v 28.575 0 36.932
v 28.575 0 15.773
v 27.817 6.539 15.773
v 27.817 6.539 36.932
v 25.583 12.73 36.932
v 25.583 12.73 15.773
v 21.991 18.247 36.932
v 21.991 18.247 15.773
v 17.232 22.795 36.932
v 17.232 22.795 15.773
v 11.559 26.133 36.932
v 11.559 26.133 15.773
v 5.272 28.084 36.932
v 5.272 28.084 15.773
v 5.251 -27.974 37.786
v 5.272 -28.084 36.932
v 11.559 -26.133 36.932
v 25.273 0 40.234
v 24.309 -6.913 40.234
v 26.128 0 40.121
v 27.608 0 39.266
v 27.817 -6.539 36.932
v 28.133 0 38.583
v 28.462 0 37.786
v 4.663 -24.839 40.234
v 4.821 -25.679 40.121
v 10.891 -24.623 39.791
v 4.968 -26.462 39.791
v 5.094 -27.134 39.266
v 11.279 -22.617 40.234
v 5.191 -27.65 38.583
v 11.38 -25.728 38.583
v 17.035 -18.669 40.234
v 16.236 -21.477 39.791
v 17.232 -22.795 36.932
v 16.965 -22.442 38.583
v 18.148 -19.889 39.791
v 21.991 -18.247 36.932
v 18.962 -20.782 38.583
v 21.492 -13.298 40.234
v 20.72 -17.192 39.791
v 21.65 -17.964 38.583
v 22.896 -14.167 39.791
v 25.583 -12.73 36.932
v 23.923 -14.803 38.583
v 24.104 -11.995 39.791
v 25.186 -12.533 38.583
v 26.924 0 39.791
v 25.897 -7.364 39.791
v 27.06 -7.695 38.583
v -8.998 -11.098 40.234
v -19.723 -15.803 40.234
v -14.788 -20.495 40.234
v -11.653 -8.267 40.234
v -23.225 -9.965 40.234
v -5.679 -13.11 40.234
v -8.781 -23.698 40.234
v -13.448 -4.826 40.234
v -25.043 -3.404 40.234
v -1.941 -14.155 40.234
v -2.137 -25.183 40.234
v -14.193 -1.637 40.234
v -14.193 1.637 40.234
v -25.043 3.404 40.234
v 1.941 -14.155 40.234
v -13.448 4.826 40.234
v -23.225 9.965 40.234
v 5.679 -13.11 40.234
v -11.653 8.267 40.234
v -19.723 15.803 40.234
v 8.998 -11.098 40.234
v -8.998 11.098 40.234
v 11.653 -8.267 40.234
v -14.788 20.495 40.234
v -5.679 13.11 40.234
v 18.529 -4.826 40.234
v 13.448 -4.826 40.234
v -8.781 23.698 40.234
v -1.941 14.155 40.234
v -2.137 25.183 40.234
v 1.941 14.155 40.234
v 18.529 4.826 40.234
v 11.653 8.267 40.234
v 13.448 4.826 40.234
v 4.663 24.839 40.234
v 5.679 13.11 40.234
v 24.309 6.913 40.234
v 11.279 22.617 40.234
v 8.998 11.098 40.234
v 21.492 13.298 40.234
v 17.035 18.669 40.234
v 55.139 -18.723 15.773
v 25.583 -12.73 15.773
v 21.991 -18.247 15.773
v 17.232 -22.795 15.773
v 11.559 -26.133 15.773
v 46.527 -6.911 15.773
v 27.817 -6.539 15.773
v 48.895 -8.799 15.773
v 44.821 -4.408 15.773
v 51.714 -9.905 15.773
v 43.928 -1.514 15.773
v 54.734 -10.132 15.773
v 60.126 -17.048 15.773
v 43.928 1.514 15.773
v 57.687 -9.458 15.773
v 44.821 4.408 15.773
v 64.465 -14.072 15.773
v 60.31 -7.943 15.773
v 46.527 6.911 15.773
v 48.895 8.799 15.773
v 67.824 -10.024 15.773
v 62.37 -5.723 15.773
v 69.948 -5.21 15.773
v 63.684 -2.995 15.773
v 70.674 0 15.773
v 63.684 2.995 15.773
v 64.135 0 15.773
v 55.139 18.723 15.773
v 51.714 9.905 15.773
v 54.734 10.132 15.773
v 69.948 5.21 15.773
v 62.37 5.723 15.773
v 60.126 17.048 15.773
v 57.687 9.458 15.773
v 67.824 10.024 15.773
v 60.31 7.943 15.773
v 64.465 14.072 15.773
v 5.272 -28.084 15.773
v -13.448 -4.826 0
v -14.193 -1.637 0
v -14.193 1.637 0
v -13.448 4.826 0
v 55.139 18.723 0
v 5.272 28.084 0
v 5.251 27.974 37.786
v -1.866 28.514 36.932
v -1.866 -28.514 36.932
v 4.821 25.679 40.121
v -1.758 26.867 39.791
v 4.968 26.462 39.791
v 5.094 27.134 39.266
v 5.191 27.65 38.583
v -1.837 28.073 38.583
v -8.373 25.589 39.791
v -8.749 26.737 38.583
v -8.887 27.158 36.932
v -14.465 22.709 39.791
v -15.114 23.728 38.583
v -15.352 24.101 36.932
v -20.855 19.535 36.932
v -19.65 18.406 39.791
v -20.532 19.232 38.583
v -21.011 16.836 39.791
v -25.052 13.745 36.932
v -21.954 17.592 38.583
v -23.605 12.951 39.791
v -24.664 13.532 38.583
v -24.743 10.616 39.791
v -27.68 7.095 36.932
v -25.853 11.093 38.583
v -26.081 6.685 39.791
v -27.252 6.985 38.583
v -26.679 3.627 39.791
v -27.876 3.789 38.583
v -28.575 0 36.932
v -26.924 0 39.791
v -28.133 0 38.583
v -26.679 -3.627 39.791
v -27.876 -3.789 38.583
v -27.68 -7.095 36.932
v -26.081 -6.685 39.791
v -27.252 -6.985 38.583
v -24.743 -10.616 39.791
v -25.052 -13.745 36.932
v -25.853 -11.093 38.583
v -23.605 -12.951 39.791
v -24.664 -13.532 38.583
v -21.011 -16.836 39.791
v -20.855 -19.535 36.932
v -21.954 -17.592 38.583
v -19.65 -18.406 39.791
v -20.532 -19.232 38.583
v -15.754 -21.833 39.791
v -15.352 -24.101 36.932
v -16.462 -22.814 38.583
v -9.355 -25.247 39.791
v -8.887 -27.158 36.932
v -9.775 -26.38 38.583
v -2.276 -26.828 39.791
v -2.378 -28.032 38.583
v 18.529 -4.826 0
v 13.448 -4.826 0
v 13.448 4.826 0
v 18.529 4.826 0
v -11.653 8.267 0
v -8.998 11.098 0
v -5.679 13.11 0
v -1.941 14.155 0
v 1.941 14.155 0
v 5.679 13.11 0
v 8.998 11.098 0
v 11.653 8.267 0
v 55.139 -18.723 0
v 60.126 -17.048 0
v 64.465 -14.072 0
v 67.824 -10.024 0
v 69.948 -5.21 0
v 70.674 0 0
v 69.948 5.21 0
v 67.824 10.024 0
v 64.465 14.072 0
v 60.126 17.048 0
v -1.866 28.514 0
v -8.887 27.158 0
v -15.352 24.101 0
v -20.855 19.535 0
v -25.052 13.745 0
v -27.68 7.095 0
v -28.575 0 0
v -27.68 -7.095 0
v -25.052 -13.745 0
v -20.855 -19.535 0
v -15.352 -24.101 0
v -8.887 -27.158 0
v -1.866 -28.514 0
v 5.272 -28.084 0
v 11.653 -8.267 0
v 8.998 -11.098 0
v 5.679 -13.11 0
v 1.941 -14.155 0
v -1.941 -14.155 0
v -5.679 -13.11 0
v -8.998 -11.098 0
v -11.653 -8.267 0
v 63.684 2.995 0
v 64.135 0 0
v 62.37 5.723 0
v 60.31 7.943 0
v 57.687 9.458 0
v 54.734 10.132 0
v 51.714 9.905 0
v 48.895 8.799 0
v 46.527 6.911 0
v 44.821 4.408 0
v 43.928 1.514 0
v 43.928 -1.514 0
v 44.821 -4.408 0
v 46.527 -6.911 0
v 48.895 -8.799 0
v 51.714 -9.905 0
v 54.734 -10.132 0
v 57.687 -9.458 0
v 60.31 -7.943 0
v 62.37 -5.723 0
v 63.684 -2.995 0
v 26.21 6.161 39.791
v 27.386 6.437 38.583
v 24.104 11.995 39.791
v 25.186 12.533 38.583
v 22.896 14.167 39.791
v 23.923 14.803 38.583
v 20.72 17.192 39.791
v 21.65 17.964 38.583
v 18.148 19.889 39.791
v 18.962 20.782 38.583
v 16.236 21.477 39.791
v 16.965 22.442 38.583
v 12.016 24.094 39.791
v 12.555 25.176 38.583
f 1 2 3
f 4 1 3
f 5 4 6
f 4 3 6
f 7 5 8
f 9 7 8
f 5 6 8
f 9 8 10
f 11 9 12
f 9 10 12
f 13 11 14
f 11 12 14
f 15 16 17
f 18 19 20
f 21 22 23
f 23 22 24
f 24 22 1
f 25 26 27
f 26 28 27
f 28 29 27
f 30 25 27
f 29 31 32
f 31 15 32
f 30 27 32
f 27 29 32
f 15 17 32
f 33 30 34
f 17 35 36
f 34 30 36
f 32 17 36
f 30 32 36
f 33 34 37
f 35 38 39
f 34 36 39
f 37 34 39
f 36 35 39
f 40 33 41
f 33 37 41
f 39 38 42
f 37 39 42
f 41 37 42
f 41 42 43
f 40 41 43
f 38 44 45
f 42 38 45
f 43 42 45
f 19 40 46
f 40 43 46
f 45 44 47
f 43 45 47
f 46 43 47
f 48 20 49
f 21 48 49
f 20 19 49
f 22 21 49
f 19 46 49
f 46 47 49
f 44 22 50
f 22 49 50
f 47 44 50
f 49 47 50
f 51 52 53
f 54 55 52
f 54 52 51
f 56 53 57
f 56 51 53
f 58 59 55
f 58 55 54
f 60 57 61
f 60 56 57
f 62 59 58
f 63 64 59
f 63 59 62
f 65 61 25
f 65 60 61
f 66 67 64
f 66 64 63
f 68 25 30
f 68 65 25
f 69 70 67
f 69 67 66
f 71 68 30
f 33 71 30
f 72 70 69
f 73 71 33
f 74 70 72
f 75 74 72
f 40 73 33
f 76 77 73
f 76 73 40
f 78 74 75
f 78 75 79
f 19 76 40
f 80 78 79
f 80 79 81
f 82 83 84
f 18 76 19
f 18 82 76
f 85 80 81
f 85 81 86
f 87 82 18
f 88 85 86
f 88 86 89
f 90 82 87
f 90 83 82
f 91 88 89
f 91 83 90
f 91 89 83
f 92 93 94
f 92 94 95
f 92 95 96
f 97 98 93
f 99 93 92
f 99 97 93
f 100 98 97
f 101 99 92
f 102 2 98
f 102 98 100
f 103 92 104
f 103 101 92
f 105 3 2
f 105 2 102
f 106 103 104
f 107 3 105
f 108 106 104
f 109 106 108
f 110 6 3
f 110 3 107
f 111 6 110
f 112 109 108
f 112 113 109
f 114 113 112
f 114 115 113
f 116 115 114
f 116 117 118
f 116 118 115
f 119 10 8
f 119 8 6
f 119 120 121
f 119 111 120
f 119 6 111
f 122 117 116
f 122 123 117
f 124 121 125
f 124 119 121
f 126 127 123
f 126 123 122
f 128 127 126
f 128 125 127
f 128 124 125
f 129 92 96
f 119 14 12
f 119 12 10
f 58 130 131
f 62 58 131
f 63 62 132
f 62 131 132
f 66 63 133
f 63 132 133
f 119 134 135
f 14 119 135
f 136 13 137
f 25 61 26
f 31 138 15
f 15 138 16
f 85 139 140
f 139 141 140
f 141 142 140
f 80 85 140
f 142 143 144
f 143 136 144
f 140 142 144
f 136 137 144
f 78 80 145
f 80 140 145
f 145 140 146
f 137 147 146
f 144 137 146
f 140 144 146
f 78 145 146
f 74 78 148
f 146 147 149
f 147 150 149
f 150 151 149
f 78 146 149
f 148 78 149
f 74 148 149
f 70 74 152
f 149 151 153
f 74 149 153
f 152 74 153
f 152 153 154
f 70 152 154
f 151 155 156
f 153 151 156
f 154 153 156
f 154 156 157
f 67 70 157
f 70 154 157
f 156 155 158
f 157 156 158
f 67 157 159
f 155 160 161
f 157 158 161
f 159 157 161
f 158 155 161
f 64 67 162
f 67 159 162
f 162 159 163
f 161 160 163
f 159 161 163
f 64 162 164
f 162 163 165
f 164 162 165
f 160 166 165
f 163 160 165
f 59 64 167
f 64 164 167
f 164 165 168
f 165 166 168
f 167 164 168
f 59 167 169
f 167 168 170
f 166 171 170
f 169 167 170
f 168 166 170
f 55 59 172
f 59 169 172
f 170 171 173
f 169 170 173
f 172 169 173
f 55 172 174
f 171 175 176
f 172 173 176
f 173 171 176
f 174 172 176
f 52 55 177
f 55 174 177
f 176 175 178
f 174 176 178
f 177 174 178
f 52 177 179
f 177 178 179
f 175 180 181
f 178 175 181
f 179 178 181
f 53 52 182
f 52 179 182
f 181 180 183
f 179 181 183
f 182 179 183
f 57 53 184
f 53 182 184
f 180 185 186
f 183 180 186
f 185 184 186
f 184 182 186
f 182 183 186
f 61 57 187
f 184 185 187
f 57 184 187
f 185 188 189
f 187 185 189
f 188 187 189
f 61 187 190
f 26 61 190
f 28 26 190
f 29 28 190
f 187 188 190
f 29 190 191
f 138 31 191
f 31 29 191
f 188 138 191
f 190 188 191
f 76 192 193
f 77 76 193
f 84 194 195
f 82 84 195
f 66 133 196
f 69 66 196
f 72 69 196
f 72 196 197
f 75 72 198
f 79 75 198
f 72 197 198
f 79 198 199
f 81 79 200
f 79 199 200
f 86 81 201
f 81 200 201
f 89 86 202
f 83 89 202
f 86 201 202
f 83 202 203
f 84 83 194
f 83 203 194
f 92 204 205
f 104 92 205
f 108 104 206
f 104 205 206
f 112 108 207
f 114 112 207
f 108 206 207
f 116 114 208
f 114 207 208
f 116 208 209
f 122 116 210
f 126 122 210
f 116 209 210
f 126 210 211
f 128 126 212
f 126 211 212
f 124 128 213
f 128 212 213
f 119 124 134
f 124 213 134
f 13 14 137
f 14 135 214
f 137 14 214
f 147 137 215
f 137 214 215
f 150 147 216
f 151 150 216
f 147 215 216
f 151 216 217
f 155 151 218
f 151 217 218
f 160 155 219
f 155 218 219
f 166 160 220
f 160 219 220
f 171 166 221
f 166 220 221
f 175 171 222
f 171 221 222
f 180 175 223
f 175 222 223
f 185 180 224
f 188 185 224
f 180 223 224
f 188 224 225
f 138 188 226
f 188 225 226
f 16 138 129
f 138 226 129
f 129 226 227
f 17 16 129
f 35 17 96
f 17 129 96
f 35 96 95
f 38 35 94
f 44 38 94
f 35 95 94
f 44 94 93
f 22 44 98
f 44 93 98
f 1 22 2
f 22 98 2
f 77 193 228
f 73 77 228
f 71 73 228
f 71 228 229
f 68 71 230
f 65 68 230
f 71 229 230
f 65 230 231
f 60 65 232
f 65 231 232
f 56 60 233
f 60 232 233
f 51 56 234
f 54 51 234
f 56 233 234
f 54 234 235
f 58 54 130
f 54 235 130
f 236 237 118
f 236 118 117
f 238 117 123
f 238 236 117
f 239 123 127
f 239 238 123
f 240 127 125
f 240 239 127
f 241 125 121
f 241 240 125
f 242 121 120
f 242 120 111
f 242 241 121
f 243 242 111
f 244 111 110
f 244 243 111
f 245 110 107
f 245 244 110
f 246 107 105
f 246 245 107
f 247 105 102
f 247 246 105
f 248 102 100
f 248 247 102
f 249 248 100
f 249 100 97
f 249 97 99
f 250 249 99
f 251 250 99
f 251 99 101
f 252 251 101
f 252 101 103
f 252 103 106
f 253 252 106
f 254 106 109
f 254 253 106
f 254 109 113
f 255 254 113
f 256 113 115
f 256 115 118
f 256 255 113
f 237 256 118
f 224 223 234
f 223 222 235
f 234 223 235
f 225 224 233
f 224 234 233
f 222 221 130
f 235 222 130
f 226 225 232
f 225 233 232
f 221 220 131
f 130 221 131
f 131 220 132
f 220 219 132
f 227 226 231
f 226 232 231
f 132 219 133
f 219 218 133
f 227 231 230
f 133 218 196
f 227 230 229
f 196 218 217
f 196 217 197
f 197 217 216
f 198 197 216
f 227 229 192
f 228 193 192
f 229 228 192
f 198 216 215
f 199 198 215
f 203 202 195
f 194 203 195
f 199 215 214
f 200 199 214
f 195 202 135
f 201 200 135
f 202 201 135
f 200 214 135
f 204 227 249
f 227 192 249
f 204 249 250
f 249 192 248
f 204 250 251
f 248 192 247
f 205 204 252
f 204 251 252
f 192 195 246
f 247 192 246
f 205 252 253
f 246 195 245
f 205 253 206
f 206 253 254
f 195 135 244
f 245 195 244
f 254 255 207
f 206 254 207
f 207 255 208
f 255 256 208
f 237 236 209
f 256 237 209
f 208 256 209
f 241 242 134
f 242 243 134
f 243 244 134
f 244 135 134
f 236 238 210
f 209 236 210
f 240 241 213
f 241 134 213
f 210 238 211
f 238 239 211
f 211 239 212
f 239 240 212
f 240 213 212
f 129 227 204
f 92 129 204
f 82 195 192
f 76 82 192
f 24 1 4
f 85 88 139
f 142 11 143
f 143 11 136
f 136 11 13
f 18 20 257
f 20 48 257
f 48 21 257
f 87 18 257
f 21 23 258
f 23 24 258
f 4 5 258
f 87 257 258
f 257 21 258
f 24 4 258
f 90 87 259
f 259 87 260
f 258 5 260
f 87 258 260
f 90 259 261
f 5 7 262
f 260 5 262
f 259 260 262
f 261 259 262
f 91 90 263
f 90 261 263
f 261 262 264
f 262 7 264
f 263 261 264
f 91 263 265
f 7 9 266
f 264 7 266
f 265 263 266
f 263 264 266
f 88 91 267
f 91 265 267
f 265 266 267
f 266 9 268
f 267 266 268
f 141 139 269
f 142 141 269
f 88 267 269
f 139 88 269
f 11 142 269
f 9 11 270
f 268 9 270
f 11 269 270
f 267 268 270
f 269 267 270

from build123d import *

# Parameters (mm, degrees)
F0_R     = 10.16
F1_DEPTH = 15.7734
F2_DEPTH = 40.2336
F3_R     = 3.302


with BuildPart() as f1:
    # F0 (on Top) → F1 (new body)
    with BuildSketch(Plane.XY):
        with BuildLine():
            ThreePointArc((5.272246, 28.084409), (21.990737, 18.246591), (28.575, 0))
            ThreePointArc((28.575, 0), (21.990737, -18.246591), (5.272246, -28.084409))
            Line((5.272246, -28.084409), (55.139294, -18.72294))
            ThreePointArc((55.139294, -18.72294), (70.674464, 0), (55.139294, 18.72294))
            Line((55.139294, 18.72294), (5.272246, 28.084409))
        make_face()
        with Locations((53.975, 0)):
            Circle(F0_R, mode=Mode.SUBTRACT)
    extrude(amount=F1_DEPTH)

    # F0 (on Top) → F2 (join)
    with BuildSketch(Plane.XY):
        with BuildLine():
            ThreePointArc((5.272246, -28.084409), (21.990737, -18.246591), (28.575, 0))
            ThreePointArc((28.575, 0), (21.990737, 18.246591), (5.272246, 28.084409))
            ThreePointArc((5.272246, 28.084409), (-28.575, 0), (5.272246, -28.084409))
        make_face()
        with BuildLine():
            ThreePointArc((-13.447765, 4.826), (0, 14.2875), (13.447765, 4.826))
            Line((13.447765, 4.826), (18.5293, 4.826))
            Line((18.5293, 4.826), (18.5293, -4.826))
            Line((18.5293, -4.826), (13.447765, -4.826))
            ThreePointArc((13.447765, -4.826), (0, -14.2875), (-13.447765, -4.826))
            Line((-13.447765, -4.826), (-18.5293, -4.826))
            Line((-18.5293, -4.826), (-18.5293, 4.826))
            Line((-18.5293, 4.826), (-13.447765, 4.826))
        make_face(mode=Mode.SUBTRACT)
        with BuildLine():
            ThreePointArc((-13.447765, -4.826), (-14.2875, 0), (-13.447765, 4.826))
            Line((-13.447765, 4.826), (-18.5293, 4.826))
            Line((-18.5293, 4.826), (-18.5293, -4.826))
            Line((-18.5293, -4.826), (-13.447765, -4.826))
        make_face()
    extrude(amount=F2_DEPTH)

    # F3
    f3_edges = [f1.edges().sort_by_distance(p)[0] for p in [
        (-5.272246, 28.084409, 40.2336),
    ]]
    fillet(f3_edges, radius=F3_R)


solid = f1.part
